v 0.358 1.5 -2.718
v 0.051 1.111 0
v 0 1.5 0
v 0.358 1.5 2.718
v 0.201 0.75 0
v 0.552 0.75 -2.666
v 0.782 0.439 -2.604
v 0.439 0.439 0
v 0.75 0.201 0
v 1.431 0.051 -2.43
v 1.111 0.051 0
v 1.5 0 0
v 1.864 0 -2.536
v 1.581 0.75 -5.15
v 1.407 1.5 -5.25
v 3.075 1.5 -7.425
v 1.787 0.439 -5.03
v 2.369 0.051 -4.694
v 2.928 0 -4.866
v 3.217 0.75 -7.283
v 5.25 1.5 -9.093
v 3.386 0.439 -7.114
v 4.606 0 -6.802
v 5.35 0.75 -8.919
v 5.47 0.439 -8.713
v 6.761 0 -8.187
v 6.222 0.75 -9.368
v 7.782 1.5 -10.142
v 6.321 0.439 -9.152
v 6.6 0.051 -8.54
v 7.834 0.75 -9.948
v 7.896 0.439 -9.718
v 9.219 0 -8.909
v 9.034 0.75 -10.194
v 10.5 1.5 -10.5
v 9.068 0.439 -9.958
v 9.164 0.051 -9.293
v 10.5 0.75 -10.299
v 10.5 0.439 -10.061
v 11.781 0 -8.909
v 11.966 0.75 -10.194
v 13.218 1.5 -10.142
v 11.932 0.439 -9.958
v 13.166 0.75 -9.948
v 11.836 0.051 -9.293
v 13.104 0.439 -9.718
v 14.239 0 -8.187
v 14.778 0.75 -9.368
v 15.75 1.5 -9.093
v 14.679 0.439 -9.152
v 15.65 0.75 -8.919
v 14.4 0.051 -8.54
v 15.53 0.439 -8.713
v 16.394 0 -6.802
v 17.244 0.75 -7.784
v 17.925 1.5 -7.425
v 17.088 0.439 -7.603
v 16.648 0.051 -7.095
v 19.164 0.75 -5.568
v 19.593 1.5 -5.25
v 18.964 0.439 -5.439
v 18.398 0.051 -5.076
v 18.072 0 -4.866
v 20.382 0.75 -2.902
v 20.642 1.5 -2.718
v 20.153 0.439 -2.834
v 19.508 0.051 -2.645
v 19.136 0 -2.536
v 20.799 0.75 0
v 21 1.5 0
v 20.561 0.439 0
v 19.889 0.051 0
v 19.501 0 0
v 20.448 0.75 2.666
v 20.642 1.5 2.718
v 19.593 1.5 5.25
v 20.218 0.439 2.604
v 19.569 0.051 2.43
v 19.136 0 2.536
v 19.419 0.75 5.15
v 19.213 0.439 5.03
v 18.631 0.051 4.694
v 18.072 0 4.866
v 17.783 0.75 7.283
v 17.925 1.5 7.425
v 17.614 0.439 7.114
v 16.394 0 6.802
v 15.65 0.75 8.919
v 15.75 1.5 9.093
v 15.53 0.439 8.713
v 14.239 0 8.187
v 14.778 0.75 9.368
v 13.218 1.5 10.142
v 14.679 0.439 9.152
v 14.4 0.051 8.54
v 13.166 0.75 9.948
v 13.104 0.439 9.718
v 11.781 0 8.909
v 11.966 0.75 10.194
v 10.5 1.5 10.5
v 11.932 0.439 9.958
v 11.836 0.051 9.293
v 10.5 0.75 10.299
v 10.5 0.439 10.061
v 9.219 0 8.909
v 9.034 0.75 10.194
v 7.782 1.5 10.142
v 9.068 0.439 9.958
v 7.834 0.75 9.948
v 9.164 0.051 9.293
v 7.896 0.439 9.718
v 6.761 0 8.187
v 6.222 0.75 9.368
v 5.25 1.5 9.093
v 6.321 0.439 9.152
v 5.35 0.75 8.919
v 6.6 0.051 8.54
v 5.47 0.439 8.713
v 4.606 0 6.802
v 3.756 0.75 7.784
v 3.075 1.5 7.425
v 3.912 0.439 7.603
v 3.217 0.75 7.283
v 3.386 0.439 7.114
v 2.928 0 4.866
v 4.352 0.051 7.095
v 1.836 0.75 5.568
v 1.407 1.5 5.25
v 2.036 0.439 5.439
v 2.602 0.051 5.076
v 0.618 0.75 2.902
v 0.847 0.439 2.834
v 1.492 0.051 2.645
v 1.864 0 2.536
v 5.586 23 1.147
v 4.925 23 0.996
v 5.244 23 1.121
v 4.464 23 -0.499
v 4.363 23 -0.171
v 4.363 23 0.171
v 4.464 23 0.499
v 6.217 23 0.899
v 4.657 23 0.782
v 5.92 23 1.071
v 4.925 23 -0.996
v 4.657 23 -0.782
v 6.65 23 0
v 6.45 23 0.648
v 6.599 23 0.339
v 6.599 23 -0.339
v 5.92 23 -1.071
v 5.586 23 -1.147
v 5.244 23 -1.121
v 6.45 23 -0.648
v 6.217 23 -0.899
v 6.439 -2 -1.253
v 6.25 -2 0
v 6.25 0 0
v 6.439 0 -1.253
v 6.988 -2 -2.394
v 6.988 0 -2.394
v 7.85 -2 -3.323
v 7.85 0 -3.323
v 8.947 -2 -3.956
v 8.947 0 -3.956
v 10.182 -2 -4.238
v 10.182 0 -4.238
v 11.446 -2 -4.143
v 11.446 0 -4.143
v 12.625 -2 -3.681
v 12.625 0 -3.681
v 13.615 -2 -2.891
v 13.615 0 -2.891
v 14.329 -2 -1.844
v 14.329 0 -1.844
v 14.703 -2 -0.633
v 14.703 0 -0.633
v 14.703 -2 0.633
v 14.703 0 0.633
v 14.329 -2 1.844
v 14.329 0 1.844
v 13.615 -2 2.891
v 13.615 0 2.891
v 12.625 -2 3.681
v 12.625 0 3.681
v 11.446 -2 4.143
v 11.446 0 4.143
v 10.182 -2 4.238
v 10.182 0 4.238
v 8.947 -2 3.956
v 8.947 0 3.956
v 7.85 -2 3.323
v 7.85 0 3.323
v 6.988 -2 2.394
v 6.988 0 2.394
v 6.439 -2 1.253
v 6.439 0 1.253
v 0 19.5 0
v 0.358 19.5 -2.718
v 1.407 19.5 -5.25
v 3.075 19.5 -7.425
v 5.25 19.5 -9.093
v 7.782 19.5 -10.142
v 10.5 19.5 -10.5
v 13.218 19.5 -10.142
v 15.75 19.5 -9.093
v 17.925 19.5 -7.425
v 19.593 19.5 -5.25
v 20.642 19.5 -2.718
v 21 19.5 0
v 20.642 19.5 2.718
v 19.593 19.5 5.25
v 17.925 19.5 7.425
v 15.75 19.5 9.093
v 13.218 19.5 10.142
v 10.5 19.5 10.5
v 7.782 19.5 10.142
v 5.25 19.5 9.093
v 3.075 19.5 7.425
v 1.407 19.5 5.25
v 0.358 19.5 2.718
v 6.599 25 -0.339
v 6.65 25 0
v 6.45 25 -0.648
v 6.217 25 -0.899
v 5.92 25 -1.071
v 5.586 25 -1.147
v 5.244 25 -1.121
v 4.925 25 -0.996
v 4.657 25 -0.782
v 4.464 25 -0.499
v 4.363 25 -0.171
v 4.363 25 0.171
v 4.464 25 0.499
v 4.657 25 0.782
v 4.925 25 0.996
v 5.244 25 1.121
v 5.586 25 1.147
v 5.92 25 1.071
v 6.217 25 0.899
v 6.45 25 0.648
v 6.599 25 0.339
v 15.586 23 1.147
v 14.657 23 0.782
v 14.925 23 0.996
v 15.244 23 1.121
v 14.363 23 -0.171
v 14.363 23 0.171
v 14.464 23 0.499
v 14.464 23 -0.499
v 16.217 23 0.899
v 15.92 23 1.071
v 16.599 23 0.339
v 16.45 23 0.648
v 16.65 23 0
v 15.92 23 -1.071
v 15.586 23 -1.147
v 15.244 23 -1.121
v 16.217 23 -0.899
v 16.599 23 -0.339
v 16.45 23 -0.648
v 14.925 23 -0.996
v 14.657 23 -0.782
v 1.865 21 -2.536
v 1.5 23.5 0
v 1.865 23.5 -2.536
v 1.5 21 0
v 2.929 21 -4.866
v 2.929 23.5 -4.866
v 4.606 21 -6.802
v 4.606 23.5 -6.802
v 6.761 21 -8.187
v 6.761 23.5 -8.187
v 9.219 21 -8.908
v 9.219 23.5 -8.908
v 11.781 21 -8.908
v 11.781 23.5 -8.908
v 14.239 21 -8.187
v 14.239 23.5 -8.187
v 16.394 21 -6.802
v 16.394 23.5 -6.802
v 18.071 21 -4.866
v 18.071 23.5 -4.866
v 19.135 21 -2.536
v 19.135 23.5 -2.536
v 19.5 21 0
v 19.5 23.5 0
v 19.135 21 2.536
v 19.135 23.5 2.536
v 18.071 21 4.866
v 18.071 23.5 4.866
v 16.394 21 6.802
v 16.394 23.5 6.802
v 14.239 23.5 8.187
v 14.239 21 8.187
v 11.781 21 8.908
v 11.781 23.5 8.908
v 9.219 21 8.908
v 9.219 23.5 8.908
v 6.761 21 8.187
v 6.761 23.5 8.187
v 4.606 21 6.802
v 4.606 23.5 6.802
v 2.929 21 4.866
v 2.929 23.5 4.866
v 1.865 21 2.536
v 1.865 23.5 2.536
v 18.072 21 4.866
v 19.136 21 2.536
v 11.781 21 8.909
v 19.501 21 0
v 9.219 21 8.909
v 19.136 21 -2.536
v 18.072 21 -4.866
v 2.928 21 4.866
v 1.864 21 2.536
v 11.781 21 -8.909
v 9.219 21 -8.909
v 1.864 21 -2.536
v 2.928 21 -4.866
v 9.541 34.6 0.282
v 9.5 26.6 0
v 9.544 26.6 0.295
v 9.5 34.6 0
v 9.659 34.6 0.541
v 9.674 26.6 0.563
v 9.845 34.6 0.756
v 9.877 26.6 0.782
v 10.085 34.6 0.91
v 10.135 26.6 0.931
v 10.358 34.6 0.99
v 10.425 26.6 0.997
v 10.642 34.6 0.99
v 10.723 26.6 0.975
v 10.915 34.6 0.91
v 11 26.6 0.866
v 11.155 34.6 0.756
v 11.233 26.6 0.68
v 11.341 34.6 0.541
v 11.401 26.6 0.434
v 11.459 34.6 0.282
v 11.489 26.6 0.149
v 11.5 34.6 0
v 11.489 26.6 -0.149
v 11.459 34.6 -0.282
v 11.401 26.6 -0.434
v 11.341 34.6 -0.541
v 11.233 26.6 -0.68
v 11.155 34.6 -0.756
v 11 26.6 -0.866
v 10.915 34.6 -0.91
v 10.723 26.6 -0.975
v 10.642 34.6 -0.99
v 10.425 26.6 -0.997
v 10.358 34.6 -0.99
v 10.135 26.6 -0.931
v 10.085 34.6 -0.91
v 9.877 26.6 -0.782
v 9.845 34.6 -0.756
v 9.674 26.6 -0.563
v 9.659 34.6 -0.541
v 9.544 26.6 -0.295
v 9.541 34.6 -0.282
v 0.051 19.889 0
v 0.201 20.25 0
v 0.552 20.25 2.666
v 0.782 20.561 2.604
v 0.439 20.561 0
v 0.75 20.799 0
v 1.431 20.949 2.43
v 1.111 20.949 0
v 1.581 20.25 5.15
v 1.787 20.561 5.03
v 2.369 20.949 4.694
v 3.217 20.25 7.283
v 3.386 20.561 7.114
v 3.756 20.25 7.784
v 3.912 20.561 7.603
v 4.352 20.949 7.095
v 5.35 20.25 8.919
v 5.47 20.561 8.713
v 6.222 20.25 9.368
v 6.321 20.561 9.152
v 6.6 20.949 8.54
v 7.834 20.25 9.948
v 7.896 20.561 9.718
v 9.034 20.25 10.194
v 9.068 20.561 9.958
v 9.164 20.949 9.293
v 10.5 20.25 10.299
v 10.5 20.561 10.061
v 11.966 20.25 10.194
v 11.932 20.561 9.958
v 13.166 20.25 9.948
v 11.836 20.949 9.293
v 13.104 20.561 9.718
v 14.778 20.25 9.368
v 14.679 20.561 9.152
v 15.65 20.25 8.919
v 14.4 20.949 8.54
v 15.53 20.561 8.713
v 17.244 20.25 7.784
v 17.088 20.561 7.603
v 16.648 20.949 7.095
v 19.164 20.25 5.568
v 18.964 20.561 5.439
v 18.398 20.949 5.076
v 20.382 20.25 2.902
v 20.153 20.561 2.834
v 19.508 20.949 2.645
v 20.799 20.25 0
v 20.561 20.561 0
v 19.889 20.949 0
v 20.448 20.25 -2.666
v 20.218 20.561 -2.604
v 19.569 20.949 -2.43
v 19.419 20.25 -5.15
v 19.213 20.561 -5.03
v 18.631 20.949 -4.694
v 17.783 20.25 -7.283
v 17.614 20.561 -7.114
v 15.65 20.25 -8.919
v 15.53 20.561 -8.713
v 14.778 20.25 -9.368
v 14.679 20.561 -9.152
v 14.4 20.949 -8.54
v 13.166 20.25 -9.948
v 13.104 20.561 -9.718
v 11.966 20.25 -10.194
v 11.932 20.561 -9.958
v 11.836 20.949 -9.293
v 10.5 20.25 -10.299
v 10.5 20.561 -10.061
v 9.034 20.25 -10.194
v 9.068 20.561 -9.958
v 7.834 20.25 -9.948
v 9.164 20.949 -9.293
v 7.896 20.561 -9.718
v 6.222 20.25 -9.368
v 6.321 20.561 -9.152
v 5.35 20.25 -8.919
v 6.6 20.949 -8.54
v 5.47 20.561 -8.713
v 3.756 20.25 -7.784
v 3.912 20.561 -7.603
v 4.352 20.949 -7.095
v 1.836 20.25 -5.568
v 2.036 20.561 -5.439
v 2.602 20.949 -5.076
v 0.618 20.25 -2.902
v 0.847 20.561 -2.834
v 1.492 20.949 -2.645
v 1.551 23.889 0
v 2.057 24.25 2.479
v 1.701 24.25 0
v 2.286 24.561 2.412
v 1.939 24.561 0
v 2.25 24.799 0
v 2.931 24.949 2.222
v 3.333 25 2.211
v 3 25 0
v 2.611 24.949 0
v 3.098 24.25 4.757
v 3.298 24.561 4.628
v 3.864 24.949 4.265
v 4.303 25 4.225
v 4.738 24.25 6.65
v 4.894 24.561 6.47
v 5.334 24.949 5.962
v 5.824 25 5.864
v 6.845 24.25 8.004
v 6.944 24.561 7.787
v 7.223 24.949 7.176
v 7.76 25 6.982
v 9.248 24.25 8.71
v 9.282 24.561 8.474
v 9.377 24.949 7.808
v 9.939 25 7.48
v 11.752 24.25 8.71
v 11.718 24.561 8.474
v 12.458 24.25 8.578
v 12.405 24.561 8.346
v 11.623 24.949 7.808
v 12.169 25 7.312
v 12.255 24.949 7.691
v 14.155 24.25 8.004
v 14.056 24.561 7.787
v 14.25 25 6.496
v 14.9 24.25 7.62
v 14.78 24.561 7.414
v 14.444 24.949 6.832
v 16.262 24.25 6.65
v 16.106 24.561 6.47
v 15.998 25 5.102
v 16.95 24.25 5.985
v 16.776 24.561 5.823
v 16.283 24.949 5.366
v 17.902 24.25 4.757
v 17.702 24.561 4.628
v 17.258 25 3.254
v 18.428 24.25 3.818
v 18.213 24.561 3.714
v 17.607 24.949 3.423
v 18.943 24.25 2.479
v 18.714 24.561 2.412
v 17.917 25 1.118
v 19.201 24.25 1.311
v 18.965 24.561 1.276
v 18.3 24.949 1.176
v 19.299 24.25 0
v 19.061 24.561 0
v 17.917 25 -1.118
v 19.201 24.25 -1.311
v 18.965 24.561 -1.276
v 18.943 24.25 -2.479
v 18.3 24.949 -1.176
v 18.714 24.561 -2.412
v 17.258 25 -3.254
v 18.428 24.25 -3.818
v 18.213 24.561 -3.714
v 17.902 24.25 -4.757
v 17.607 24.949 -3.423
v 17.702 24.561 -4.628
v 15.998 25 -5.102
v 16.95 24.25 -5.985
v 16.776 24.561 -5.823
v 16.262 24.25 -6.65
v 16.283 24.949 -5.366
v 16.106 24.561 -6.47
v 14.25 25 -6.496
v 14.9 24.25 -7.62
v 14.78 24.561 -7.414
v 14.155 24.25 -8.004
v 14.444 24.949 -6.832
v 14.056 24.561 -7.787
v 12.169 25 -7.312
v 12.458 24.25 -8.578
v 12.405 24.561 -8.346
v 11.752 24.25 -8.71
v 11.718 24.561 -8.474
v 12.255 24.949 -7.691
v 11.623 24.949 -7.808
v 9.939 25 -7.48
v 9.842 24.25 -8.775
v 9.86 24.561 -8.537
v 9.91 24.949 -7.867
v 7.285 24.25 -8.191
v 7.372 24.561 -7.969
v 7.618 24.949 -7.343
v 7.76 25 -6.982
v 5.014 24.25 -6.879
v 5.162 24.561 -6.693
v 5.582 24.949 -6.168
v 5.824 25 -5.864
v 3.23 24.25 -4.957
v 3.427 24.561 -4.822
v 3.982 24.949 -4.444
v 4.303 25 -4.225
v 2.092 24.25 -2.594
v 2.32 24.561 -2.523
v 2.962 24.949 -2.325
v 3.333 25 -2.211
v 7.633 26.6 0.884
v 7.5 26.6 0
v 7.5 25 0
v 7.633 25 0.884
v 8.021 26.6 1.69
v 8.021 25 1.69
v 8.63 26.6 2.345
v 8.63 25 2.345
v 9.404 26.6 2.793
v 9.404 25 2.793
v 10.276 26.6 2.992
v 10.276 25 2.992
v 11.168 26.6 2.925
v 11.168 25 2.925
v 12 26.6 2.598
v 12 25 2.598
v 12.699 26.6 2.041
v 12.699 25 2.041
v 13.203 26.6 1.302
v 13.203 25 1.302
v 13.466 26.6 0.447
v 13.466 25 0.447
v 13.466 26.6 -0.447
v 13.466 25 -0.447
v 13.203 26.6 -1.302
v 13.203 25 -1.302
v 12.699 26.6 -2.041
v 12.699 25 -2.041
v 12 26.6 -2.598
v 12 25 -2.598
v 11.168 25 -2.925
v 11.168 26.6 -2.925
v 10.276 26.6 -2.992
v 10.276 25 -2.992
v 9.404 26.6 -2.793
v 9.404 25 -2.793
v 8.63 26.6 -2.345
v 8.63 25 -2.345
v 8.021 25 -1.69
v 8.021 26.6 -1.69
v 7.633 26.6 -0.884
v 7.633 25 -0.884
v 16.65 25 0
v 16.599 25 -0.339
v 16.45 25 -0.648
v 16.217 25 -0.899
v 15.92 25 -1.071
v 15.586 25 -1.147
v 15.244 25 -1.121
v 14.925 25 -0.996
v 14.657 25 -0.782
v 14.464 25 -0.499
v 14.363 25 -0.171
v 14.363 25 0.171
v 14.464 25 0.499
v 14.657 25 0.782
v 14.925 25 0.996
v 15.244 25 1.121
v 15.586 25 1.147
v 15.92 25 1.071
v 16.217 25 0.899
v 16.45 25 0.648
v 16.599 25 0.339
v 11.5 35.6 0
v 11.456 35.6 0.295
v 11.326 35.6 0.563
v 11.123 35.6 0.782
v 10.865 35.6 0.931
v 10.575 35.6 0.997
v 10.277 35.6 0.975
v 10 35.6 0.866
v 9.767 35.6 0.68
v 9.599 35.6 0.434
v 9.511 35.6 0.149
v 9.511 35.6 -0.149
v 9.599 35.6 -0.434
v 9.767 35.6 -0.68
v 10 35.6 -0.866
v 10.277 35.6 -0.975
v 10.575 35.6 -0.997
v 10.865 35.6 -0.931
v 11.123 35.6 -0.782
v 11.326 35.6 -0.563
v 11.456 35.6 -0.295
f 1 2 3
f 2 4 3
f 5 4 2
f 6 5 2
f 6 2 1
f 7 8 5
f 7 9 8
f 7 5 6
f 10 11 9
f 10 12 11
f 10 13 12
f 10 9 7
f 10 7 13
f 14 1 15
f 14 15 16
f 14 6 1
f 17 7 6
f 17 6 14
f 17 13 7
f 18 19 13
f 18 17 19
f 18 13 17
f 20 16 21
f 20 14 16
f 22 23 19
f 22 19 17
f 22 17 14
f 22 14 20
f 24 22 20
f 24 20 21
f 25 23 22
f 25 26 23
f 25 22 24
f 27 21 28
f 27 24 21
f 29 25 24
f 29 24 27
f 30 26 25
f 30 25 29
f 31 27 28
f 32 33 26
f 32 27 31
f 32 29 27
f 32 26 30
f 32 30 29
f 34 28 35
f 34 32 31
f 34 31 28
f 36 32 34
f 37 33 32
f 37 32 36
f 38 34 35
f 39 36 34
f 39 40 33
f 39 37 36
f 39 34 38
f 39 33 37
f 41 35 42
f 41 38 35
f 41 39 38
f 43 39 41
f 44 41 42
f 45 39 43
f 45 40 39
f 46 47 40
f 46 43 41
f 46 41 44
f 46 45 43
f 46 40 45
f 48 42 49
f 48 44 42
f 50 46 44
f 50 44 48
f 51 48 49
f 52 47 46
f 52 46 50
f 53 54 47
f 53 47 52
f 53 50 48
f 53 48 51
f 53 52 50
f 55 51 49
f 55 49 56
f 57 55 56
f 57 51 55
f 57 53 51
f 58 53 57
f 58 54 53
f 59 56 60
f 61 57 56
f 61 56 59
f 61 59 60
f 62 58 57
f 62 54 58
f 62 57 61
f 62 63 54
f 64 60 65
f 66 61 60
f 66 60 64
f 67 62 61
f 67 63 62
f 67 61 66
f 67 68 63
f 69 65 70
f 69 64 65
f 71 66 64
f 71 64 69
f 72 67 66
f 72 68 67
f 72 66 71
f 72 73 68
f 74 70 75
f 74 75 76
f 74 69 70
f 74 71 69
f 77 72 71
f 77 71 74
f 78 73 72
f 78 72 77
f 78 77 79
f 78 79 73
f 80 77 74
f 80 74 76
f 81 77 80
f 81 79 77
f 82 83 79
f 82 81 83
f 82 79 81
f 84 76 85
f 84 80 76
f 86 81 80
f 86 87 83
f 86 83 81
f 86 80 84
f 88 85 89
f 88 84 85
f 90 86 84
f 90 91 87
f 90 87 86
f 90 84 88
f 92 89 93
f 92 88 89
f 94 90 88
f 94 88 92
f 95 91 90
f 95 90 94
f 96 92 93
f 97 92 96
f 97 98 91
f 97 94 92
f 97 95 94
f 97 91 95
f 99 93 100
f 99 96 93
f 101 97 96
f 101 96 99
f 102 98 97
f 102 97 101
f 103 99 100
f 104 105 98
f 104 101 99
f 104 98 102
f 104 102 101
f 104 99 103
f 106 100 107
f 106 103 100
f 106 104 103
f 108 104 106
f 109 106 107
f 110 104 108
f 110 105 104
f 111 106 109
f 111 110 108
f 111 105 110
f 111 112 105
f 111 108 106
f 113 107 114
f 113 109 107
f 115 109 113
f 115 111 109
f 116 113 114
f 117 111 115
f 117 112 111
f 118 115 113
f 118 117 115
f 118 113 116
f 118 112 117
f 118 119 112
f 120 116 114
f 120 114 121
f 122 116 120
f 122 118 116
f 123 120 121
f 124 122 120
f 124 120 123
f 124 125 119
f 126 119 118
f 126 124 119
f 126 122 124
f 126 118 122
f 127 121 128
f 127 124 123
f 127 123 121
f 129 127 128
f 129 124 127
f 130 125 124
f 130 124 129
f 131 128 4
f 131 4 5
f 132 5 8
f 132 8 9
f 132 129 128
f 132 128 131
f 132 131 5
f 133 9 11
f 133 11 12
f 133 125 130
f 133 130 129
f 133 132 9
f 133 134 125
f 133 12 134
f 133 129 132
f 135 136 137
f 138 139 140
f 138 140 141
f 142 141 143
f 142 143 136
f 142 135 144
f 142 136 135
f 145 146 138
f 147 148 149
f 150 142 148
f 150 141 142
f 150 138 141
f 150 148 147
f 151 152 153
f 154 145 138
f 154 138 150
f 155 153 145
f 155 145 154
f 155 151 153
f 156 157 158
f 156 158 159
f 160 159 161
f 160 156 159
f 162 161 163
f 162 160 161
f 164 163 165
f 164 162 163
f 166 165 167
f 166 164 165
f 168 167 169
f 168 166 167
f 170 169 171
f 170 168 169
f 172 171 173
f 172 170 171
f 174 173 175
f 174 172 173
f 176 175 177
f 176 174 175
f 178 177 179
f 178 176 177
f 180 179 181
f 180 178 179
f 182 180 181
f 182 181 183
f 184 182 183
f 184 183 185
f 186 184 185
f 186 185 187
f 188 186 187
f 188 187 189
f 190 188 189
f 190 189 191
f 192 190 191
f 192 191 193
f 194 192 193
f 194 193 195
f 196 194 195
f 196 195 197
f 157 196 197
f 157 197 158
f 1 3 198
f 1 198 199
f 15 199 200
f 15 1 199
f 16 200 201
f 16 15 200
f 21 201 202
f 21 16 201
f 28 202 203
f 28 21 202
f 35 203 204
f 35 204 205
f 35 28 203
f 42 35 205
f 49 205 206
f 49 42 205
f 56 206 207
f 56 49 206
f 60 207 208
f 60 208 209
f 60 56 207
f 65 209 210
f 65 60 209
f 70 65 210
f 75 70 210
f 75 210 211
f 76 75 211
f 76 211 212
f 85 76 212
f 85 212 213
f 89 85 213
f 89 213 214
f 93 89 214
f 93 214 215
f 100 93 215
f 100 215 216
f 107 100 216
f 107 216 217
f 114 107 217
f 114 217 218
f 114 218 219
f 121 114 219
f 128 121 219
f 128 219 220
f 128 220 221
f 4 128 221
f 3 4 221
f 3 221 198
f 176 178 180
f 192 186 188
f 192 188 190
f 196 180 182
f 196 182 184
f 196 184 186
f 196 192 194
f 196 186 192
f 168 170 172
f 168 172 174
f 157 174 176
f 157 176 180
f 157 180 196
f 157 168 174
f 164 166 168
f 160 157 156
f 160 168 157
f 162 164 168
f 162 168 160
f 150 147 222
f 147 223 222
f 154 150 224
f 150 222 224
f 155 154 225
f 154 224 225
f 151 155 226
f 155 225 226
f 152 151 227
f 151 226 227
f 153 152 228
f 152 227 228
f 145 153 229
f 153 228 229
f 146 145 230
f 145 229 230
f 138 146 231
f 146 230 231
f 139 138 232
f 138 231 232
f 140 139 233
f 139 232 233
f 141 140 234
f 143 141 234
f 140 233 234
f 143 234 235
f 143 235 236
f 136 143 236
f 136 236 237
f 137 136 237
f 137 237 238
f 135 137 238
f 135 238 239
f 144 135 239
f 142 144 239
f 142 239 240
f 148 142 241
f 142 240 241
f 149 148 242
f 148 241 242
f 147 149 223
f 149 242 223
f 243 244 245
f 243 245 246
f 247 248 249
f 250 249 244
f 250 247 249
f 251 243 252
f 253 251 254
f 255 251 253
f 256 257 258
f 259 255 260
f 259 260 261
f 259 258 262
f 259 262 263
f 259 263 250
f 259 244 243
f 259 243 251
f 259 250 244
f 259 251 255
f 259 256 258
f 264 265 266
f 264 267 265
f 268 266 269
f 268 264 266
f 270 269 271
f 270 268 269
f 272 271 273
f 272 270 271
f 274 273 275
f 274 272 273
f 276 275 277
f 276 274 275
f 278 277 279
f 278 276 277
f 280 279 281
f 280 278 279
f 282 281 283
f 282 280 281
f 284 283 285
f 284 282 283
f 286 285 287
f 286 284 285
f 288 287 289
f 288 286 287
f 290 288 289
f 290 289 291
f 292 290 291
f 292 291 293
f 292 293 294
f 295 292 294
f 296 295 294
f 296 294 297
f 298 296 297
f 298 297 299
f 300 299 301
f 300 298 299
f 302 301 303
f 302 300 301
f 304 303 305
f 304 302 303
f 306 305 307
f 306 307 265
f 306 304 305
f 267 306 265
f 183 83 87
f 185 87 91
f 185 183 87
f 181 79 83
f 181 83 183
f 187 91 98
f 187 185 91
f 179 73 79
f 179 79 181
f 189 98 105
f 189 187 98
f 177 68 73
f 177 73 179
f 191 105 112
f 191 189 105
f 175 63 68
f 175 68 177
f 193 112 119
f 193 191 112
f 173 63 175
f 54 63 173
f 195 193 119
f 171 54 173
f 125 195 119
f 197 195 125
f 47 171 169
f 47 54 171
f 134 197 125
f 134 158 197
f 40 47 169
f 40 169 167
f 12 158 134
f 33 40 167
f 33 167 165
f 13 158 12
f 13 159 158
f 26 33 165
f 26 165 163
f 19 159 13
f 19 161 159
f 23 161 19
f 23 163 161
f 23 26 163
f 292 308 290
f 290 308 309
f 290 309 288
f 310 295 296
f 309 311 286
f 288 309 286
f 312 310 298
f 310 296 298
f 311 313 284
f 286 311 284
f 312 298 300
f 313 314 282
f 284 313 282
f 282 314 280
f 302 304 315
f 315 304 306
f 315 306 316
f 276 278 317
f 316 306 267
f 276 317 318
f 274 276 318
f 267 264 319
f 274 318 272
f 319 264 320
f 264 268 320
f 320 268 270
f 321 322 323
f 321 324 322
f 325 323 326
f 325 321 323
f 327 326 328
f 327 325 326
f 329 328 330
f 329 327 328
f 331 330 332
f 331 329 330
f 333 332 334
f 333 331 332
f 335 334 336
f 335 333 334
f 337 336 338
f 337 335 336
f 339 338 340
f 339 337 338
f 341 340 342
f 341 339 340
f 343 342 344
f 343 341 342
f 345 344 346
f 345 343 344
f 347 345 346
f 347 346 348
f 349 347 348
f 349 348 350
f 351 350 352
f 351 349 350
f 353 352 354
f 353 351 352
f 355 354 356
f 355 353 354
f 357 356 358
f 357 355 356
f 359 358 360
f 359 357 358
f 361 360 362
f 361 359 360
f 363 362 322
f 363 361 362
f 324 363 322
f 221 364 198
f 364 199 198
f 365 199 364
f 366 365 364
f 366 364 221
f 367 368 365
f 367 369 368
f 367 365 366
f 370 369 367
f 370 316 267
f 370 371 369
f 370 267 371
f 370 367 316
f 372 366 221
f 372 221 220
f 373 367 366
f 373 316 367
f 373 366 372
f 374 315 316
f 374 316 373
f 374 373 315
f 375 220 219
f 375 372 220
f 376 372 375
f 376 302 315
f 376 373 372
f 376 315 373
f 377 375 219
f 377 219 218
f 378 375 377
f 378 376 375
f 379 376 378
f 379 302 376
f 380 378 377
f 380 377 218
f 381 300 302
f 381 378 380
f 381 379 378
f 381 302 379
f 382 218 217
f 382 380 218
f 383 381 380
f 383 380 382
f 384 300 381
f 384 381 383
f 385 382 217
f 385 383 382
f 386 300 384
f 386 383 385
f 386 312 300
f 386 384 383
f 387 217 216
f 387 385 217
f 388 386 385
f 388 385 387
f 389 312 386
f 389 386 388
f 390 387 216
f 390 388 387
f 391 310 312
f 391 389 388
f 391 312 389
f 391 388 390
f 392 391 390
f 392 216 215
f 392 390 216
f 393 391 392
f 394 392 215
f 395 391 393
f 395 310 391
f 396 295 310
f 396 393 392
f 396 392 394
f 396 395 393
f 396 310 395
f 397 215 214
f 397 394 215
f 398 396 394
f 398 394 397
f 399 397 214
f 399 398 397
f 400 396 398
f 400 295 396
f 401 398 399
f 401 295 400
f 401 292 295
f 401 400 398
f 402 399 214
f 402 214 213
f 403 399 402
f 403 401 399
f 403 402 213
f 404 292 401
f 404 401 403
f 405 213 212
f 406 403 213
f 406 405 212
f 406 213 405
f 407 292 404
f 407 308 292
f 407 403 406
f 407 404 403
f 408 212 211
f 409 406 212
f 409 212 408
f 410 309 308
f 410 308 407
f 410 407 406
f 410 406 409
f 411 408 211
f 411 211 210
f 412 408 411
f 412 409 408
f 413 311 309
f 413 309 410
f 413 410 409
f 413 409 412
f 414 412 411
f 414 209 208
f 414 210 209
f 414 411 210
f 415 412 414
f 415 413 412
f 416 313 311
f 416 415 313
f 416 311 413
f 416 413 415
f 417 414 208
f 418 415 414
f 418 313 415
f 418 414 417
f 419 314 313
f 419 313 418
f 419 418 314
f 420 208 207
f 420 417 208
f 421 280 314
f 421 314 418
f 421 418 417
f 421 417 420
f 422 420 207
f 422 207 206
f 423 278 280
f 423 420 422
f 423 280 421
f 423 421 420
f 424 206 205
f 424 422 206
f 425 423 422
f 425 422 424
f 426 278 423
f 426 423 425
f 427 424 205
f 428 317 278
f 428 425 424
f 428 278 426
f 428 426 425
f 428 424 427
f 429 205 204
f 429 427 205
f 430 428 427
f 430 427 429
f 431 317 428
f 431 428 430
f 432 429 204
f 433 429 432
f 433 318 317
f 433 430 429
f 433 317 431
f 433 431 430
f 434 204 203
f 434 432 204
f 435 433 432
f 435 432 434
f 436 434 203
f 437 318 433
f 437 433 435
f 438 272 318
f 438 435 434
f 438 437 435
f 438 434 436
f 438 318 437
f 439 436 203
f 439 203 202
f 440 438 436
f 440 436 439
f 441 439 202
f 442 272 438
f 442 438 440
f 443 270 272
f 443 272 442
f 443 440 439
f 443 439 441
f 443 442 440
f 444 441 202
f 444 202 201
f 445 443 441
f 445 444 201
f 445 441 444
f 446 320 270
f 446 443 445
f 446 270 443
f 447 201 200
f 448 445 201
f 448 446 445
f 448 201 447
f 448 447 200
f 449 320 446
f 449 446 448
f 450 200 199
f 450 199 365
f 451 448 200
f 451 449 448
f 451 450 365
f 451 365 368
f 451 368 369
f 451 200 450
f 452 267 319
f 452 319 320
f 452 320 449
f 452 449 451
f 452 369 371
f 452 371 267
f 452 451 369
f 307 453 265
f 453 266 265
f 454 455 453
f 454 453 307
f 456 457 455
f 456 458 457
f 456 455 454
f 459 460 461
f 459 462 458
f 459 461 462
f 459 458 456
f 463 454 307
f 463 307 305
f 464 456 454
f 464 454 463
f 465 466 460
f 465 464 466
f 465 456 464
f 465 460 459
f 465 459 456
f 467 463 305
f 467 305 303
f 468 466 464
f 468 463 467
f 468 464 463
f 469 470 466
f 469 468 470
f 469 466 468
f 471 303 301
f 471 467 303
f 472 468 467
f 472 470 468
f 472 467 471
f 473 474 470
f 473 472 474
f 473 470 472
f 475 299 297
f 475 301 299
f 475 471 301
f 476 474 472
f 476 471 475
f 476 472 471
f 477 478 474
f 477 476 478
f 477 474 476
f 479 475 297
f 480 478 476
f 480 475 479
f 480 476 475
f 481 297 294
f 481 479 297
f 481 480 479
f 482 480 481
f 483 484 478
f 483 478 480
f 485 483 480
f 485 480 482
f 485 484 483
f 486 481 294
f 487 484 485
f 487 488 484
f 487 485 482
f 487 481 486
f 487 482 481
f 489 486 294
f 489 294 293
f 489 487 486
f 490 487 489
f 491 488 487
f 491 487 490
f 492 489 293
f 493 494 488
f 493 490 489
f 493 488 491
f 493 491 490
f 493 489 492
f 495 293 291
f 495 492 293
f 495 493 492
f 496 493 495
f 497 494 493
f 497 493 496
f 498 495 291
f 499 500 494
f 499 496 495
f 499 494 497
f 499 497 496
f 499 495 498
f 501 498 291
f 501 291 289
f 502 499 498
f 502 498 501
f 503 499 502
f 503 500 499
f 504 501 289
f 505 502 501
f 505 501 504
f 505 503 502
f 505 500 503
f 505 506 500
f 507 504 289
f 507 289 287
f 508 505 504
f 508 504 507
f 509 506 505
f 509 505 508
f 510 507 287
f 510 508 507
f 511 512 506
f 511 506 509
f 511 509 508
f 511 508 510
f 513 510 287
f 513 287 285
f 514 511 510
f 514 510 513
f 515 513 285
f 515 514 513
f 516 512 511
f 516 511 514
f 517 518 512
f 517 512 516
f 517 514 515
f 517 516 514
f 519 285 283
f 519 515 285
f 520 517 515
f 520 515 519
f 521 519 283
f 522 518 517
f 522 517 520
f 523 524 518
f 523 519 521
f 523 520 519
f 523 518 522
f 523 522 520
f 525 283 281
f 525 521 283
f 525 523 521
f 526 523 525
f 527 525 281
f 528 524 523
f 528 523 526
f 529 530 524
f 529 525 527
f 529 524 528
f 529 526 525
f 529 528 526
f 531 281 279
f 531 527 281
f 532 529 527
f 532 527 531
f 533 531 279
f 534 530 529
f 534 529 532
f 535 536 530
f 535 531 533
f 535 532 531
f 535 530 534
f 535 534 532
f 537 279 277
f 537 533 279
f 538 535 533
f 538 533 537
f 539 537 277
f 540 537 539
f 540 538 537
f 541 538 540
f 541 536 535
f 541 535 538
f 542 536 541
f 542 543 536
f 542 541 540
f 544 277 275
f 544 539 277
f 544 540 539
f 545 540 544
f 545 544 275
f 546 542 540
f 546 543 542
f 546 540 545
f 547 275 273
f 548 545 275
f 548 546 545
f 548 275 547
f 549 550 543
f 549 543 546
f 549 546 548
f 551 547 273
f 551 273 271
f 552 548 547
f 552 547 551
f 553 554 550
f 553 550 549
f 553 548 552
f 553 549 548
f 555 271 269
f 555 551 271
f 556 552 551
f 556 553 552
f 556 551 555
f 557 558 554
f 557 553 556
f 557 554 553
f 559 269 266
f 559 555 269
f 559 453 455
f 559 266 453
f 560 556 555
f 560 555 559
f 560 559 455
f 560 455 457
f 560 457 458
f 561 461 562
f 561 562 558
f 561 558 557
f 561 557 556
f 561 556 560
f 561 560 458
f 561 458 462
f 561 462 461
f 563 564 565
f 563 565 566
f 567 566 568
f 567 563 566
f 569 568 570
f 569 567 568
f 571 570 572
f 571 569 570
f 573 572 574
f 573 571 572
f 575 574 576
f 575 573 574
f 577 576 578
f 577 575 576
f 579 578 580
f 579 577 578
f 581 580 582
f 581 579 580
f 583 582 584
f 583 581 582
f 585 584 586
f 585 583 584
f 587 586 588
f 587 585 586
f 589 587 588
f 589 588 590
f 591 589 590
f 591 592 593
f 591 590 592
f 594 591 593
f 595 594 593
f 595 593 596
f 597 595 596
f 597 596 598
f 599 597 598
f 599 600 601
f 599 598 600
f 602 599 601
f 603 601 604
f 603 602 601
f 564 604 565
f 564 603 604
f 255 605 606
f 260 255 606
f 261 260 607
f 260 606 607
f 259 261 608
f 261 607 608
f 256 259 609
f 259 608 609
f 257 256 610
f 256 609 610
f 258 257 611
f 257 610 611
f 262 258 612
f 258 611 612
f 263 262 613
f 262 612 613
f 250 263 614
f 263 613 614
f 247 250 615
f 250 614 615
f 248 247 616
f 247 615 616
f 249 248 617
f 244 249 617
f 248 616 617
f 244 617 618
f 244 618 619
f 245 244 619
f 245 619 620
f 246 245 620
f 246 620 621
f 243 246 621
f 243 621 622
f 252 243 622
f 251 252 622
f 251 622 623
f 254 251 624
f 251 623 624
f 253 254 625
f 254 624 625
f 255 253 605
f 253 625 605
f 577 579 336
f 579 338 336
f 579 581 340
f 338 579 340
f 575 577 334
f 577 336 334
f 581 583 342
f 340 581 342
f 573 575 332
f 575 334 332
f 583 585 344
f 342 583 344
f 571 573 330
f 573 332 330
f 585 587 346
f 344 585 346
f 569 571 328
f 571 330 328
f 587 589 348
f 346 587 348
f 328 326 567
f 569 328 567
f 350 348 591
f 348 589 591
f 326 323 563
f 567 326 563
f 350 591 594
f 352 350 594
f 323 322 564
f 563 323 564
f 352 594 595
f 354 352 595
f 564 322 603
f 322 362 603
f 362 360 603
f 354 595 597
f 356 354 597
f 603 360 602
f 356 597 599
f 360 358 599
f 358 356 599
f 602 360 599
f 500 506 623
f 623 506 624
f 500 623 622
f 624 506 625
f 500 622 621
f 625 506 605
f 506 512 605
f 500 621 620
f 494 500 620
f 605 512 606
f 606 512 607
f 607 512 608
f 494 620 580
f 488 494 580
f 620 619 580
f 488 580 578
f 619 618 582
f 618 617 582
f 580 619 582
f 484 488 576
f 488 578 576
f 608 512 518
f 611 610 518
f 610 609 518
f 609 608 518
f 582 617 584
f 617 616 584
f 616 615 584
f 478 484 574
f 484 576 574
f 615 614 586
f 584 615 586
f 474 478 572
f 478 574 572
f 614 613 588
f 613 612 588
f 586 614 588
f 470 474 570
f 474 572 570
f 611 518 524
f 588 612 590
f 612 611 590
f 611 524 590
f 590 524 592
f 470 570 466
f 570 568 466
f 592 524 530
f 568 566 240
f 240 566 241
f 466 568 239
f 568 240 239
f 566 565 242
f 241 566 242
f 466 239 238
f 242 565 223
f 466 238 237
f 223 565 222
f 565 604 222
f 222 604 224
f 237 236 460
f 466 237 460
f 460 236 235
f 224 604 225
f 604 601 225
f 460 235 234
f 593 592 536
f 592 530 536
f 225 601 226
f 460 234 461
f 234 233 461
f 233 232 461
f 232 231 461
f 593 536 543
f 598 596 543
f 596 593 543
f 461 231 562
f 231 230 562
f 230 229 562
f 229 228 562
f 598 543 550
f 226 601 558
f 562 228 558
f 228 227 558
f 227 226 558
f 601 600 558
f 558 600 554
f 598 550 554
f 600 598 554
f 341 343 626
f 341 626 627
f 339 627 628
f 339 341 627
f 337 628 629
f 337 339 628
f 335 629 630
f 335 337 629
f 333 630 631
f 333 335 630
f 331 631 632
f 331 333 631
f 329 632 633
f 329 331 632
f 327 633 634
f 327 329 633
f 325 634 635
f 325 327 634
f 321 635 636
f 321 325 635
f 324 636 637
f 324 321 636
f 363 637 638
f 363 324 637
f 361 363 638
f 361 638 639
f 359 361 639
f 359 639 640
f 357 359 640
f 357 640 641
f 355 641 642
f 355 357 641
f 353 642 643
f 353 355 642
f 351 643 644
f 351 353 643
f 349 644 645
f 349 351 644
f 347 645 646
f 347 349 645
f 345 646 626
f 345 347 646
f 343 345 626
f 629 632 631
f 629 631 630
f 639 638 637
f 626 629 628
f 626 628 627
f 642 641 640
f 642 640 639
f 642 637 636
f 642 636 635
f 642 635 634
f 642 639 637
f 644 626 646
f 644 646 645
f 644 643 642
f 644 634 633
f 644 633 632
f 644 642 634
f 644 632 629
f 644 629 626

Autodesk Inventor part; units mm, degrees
ref_plane "YZ Plane" through (0, 0, 0) normal (1, 0, 0) x (0, 1, 0)
ref_plane "XZ Plane" through (0, 0, 0) normal (0, 1, 0) x (-1, 0, 0)
ref_plane "XY Plane" through (0, 0, 0) normal (0, 0, 1) x (1, 0, 0)
sketch "Sketch3" plane through (0, 0, 0) normal (0, 0, 1) x (1, 0, 0)
  line L0 (0, 0) -> (6.25, 0)
  line L1 (6.25, 0) -> (6.25, -2)
  line L2 (1.5, 25) -> (7.5, 25)
  line L3 (7.5, 25) -> (7.5, 26.6)
  line L4 (10.5, 21) -> (10.5, -2)
  line L5 (6.25, -2) -> (10.5, -2)
  line L6 (7.5, 26.6) -> (9.5, 26.6)
  line L7 (9.5, 26.6) -> (9.5, 34.6)
  line L8 (9.5, 34.6) -> (10.5, 34.6)
  line L9 (10.5, 34.6) -> (10.5, 21)
  line L10 (1.5, 25) -> (1.5, 21)
  line L11 (1.5, 21) -> (0, 21)
  line L12 (0, 21) -> (0, 0)
  dimension "d5" = 4.25
  dimension "d7" = 1.6
  dimension "d10" = 1
  dimension "d13" = 2
  dimension "d16" = 3
  dimension "d17" = 8
  dimension "d18" = 25
  dimension "d19" = 1.5
  dimension "d20" = 4
  dimension "d21" = 10.5
  dimension "d23" = 6.25
revolve "Revolution1" add sketch "Sketch3" angle 360 about axis through (10.5, 21, 0) along (0, -1, 0)
fillet "Fillet1" radius 1.5 3 edges at (19.5, 25, 0) (21, 0, 0) (21, 21, 0)
sketch "Sketch4" plane through (10.5, 25, 0) normal (0, 1, 0) x (1, 0, 0)
  circle A0 centre (0, 0) radius 1 projected
  circle A1 centre (0, 0) radius 5 construction
  circle A2 centre (-5, 0) radius 1.15
  line L0 (-14.7, 0) -> (14.7, 0) projected
  circle A3 centre (5, 0) radius 1.15
  point P0 (-10.5, 0)
  dimension "d24" = 10
  dimension "d25" = 2.3
  dimension "d28" = 360
extrude "Extrusion2" cut sketch "Sketch4" against normal blind 2 contours A2 L0 | L0 A2 | A3 L0 | L0 A3
sketch "Sketch6" plane through (10.5, 34.6, 0) normal (0, 1, 0) x (1, 0, 0)
  circle A0 centre (0, 0) radius 1 projected
  point P0 (-10.5, 0)
extrude "Extrusion4" add sketch "Sketch6" along normal blind 1
properties part number "MOTOR"
